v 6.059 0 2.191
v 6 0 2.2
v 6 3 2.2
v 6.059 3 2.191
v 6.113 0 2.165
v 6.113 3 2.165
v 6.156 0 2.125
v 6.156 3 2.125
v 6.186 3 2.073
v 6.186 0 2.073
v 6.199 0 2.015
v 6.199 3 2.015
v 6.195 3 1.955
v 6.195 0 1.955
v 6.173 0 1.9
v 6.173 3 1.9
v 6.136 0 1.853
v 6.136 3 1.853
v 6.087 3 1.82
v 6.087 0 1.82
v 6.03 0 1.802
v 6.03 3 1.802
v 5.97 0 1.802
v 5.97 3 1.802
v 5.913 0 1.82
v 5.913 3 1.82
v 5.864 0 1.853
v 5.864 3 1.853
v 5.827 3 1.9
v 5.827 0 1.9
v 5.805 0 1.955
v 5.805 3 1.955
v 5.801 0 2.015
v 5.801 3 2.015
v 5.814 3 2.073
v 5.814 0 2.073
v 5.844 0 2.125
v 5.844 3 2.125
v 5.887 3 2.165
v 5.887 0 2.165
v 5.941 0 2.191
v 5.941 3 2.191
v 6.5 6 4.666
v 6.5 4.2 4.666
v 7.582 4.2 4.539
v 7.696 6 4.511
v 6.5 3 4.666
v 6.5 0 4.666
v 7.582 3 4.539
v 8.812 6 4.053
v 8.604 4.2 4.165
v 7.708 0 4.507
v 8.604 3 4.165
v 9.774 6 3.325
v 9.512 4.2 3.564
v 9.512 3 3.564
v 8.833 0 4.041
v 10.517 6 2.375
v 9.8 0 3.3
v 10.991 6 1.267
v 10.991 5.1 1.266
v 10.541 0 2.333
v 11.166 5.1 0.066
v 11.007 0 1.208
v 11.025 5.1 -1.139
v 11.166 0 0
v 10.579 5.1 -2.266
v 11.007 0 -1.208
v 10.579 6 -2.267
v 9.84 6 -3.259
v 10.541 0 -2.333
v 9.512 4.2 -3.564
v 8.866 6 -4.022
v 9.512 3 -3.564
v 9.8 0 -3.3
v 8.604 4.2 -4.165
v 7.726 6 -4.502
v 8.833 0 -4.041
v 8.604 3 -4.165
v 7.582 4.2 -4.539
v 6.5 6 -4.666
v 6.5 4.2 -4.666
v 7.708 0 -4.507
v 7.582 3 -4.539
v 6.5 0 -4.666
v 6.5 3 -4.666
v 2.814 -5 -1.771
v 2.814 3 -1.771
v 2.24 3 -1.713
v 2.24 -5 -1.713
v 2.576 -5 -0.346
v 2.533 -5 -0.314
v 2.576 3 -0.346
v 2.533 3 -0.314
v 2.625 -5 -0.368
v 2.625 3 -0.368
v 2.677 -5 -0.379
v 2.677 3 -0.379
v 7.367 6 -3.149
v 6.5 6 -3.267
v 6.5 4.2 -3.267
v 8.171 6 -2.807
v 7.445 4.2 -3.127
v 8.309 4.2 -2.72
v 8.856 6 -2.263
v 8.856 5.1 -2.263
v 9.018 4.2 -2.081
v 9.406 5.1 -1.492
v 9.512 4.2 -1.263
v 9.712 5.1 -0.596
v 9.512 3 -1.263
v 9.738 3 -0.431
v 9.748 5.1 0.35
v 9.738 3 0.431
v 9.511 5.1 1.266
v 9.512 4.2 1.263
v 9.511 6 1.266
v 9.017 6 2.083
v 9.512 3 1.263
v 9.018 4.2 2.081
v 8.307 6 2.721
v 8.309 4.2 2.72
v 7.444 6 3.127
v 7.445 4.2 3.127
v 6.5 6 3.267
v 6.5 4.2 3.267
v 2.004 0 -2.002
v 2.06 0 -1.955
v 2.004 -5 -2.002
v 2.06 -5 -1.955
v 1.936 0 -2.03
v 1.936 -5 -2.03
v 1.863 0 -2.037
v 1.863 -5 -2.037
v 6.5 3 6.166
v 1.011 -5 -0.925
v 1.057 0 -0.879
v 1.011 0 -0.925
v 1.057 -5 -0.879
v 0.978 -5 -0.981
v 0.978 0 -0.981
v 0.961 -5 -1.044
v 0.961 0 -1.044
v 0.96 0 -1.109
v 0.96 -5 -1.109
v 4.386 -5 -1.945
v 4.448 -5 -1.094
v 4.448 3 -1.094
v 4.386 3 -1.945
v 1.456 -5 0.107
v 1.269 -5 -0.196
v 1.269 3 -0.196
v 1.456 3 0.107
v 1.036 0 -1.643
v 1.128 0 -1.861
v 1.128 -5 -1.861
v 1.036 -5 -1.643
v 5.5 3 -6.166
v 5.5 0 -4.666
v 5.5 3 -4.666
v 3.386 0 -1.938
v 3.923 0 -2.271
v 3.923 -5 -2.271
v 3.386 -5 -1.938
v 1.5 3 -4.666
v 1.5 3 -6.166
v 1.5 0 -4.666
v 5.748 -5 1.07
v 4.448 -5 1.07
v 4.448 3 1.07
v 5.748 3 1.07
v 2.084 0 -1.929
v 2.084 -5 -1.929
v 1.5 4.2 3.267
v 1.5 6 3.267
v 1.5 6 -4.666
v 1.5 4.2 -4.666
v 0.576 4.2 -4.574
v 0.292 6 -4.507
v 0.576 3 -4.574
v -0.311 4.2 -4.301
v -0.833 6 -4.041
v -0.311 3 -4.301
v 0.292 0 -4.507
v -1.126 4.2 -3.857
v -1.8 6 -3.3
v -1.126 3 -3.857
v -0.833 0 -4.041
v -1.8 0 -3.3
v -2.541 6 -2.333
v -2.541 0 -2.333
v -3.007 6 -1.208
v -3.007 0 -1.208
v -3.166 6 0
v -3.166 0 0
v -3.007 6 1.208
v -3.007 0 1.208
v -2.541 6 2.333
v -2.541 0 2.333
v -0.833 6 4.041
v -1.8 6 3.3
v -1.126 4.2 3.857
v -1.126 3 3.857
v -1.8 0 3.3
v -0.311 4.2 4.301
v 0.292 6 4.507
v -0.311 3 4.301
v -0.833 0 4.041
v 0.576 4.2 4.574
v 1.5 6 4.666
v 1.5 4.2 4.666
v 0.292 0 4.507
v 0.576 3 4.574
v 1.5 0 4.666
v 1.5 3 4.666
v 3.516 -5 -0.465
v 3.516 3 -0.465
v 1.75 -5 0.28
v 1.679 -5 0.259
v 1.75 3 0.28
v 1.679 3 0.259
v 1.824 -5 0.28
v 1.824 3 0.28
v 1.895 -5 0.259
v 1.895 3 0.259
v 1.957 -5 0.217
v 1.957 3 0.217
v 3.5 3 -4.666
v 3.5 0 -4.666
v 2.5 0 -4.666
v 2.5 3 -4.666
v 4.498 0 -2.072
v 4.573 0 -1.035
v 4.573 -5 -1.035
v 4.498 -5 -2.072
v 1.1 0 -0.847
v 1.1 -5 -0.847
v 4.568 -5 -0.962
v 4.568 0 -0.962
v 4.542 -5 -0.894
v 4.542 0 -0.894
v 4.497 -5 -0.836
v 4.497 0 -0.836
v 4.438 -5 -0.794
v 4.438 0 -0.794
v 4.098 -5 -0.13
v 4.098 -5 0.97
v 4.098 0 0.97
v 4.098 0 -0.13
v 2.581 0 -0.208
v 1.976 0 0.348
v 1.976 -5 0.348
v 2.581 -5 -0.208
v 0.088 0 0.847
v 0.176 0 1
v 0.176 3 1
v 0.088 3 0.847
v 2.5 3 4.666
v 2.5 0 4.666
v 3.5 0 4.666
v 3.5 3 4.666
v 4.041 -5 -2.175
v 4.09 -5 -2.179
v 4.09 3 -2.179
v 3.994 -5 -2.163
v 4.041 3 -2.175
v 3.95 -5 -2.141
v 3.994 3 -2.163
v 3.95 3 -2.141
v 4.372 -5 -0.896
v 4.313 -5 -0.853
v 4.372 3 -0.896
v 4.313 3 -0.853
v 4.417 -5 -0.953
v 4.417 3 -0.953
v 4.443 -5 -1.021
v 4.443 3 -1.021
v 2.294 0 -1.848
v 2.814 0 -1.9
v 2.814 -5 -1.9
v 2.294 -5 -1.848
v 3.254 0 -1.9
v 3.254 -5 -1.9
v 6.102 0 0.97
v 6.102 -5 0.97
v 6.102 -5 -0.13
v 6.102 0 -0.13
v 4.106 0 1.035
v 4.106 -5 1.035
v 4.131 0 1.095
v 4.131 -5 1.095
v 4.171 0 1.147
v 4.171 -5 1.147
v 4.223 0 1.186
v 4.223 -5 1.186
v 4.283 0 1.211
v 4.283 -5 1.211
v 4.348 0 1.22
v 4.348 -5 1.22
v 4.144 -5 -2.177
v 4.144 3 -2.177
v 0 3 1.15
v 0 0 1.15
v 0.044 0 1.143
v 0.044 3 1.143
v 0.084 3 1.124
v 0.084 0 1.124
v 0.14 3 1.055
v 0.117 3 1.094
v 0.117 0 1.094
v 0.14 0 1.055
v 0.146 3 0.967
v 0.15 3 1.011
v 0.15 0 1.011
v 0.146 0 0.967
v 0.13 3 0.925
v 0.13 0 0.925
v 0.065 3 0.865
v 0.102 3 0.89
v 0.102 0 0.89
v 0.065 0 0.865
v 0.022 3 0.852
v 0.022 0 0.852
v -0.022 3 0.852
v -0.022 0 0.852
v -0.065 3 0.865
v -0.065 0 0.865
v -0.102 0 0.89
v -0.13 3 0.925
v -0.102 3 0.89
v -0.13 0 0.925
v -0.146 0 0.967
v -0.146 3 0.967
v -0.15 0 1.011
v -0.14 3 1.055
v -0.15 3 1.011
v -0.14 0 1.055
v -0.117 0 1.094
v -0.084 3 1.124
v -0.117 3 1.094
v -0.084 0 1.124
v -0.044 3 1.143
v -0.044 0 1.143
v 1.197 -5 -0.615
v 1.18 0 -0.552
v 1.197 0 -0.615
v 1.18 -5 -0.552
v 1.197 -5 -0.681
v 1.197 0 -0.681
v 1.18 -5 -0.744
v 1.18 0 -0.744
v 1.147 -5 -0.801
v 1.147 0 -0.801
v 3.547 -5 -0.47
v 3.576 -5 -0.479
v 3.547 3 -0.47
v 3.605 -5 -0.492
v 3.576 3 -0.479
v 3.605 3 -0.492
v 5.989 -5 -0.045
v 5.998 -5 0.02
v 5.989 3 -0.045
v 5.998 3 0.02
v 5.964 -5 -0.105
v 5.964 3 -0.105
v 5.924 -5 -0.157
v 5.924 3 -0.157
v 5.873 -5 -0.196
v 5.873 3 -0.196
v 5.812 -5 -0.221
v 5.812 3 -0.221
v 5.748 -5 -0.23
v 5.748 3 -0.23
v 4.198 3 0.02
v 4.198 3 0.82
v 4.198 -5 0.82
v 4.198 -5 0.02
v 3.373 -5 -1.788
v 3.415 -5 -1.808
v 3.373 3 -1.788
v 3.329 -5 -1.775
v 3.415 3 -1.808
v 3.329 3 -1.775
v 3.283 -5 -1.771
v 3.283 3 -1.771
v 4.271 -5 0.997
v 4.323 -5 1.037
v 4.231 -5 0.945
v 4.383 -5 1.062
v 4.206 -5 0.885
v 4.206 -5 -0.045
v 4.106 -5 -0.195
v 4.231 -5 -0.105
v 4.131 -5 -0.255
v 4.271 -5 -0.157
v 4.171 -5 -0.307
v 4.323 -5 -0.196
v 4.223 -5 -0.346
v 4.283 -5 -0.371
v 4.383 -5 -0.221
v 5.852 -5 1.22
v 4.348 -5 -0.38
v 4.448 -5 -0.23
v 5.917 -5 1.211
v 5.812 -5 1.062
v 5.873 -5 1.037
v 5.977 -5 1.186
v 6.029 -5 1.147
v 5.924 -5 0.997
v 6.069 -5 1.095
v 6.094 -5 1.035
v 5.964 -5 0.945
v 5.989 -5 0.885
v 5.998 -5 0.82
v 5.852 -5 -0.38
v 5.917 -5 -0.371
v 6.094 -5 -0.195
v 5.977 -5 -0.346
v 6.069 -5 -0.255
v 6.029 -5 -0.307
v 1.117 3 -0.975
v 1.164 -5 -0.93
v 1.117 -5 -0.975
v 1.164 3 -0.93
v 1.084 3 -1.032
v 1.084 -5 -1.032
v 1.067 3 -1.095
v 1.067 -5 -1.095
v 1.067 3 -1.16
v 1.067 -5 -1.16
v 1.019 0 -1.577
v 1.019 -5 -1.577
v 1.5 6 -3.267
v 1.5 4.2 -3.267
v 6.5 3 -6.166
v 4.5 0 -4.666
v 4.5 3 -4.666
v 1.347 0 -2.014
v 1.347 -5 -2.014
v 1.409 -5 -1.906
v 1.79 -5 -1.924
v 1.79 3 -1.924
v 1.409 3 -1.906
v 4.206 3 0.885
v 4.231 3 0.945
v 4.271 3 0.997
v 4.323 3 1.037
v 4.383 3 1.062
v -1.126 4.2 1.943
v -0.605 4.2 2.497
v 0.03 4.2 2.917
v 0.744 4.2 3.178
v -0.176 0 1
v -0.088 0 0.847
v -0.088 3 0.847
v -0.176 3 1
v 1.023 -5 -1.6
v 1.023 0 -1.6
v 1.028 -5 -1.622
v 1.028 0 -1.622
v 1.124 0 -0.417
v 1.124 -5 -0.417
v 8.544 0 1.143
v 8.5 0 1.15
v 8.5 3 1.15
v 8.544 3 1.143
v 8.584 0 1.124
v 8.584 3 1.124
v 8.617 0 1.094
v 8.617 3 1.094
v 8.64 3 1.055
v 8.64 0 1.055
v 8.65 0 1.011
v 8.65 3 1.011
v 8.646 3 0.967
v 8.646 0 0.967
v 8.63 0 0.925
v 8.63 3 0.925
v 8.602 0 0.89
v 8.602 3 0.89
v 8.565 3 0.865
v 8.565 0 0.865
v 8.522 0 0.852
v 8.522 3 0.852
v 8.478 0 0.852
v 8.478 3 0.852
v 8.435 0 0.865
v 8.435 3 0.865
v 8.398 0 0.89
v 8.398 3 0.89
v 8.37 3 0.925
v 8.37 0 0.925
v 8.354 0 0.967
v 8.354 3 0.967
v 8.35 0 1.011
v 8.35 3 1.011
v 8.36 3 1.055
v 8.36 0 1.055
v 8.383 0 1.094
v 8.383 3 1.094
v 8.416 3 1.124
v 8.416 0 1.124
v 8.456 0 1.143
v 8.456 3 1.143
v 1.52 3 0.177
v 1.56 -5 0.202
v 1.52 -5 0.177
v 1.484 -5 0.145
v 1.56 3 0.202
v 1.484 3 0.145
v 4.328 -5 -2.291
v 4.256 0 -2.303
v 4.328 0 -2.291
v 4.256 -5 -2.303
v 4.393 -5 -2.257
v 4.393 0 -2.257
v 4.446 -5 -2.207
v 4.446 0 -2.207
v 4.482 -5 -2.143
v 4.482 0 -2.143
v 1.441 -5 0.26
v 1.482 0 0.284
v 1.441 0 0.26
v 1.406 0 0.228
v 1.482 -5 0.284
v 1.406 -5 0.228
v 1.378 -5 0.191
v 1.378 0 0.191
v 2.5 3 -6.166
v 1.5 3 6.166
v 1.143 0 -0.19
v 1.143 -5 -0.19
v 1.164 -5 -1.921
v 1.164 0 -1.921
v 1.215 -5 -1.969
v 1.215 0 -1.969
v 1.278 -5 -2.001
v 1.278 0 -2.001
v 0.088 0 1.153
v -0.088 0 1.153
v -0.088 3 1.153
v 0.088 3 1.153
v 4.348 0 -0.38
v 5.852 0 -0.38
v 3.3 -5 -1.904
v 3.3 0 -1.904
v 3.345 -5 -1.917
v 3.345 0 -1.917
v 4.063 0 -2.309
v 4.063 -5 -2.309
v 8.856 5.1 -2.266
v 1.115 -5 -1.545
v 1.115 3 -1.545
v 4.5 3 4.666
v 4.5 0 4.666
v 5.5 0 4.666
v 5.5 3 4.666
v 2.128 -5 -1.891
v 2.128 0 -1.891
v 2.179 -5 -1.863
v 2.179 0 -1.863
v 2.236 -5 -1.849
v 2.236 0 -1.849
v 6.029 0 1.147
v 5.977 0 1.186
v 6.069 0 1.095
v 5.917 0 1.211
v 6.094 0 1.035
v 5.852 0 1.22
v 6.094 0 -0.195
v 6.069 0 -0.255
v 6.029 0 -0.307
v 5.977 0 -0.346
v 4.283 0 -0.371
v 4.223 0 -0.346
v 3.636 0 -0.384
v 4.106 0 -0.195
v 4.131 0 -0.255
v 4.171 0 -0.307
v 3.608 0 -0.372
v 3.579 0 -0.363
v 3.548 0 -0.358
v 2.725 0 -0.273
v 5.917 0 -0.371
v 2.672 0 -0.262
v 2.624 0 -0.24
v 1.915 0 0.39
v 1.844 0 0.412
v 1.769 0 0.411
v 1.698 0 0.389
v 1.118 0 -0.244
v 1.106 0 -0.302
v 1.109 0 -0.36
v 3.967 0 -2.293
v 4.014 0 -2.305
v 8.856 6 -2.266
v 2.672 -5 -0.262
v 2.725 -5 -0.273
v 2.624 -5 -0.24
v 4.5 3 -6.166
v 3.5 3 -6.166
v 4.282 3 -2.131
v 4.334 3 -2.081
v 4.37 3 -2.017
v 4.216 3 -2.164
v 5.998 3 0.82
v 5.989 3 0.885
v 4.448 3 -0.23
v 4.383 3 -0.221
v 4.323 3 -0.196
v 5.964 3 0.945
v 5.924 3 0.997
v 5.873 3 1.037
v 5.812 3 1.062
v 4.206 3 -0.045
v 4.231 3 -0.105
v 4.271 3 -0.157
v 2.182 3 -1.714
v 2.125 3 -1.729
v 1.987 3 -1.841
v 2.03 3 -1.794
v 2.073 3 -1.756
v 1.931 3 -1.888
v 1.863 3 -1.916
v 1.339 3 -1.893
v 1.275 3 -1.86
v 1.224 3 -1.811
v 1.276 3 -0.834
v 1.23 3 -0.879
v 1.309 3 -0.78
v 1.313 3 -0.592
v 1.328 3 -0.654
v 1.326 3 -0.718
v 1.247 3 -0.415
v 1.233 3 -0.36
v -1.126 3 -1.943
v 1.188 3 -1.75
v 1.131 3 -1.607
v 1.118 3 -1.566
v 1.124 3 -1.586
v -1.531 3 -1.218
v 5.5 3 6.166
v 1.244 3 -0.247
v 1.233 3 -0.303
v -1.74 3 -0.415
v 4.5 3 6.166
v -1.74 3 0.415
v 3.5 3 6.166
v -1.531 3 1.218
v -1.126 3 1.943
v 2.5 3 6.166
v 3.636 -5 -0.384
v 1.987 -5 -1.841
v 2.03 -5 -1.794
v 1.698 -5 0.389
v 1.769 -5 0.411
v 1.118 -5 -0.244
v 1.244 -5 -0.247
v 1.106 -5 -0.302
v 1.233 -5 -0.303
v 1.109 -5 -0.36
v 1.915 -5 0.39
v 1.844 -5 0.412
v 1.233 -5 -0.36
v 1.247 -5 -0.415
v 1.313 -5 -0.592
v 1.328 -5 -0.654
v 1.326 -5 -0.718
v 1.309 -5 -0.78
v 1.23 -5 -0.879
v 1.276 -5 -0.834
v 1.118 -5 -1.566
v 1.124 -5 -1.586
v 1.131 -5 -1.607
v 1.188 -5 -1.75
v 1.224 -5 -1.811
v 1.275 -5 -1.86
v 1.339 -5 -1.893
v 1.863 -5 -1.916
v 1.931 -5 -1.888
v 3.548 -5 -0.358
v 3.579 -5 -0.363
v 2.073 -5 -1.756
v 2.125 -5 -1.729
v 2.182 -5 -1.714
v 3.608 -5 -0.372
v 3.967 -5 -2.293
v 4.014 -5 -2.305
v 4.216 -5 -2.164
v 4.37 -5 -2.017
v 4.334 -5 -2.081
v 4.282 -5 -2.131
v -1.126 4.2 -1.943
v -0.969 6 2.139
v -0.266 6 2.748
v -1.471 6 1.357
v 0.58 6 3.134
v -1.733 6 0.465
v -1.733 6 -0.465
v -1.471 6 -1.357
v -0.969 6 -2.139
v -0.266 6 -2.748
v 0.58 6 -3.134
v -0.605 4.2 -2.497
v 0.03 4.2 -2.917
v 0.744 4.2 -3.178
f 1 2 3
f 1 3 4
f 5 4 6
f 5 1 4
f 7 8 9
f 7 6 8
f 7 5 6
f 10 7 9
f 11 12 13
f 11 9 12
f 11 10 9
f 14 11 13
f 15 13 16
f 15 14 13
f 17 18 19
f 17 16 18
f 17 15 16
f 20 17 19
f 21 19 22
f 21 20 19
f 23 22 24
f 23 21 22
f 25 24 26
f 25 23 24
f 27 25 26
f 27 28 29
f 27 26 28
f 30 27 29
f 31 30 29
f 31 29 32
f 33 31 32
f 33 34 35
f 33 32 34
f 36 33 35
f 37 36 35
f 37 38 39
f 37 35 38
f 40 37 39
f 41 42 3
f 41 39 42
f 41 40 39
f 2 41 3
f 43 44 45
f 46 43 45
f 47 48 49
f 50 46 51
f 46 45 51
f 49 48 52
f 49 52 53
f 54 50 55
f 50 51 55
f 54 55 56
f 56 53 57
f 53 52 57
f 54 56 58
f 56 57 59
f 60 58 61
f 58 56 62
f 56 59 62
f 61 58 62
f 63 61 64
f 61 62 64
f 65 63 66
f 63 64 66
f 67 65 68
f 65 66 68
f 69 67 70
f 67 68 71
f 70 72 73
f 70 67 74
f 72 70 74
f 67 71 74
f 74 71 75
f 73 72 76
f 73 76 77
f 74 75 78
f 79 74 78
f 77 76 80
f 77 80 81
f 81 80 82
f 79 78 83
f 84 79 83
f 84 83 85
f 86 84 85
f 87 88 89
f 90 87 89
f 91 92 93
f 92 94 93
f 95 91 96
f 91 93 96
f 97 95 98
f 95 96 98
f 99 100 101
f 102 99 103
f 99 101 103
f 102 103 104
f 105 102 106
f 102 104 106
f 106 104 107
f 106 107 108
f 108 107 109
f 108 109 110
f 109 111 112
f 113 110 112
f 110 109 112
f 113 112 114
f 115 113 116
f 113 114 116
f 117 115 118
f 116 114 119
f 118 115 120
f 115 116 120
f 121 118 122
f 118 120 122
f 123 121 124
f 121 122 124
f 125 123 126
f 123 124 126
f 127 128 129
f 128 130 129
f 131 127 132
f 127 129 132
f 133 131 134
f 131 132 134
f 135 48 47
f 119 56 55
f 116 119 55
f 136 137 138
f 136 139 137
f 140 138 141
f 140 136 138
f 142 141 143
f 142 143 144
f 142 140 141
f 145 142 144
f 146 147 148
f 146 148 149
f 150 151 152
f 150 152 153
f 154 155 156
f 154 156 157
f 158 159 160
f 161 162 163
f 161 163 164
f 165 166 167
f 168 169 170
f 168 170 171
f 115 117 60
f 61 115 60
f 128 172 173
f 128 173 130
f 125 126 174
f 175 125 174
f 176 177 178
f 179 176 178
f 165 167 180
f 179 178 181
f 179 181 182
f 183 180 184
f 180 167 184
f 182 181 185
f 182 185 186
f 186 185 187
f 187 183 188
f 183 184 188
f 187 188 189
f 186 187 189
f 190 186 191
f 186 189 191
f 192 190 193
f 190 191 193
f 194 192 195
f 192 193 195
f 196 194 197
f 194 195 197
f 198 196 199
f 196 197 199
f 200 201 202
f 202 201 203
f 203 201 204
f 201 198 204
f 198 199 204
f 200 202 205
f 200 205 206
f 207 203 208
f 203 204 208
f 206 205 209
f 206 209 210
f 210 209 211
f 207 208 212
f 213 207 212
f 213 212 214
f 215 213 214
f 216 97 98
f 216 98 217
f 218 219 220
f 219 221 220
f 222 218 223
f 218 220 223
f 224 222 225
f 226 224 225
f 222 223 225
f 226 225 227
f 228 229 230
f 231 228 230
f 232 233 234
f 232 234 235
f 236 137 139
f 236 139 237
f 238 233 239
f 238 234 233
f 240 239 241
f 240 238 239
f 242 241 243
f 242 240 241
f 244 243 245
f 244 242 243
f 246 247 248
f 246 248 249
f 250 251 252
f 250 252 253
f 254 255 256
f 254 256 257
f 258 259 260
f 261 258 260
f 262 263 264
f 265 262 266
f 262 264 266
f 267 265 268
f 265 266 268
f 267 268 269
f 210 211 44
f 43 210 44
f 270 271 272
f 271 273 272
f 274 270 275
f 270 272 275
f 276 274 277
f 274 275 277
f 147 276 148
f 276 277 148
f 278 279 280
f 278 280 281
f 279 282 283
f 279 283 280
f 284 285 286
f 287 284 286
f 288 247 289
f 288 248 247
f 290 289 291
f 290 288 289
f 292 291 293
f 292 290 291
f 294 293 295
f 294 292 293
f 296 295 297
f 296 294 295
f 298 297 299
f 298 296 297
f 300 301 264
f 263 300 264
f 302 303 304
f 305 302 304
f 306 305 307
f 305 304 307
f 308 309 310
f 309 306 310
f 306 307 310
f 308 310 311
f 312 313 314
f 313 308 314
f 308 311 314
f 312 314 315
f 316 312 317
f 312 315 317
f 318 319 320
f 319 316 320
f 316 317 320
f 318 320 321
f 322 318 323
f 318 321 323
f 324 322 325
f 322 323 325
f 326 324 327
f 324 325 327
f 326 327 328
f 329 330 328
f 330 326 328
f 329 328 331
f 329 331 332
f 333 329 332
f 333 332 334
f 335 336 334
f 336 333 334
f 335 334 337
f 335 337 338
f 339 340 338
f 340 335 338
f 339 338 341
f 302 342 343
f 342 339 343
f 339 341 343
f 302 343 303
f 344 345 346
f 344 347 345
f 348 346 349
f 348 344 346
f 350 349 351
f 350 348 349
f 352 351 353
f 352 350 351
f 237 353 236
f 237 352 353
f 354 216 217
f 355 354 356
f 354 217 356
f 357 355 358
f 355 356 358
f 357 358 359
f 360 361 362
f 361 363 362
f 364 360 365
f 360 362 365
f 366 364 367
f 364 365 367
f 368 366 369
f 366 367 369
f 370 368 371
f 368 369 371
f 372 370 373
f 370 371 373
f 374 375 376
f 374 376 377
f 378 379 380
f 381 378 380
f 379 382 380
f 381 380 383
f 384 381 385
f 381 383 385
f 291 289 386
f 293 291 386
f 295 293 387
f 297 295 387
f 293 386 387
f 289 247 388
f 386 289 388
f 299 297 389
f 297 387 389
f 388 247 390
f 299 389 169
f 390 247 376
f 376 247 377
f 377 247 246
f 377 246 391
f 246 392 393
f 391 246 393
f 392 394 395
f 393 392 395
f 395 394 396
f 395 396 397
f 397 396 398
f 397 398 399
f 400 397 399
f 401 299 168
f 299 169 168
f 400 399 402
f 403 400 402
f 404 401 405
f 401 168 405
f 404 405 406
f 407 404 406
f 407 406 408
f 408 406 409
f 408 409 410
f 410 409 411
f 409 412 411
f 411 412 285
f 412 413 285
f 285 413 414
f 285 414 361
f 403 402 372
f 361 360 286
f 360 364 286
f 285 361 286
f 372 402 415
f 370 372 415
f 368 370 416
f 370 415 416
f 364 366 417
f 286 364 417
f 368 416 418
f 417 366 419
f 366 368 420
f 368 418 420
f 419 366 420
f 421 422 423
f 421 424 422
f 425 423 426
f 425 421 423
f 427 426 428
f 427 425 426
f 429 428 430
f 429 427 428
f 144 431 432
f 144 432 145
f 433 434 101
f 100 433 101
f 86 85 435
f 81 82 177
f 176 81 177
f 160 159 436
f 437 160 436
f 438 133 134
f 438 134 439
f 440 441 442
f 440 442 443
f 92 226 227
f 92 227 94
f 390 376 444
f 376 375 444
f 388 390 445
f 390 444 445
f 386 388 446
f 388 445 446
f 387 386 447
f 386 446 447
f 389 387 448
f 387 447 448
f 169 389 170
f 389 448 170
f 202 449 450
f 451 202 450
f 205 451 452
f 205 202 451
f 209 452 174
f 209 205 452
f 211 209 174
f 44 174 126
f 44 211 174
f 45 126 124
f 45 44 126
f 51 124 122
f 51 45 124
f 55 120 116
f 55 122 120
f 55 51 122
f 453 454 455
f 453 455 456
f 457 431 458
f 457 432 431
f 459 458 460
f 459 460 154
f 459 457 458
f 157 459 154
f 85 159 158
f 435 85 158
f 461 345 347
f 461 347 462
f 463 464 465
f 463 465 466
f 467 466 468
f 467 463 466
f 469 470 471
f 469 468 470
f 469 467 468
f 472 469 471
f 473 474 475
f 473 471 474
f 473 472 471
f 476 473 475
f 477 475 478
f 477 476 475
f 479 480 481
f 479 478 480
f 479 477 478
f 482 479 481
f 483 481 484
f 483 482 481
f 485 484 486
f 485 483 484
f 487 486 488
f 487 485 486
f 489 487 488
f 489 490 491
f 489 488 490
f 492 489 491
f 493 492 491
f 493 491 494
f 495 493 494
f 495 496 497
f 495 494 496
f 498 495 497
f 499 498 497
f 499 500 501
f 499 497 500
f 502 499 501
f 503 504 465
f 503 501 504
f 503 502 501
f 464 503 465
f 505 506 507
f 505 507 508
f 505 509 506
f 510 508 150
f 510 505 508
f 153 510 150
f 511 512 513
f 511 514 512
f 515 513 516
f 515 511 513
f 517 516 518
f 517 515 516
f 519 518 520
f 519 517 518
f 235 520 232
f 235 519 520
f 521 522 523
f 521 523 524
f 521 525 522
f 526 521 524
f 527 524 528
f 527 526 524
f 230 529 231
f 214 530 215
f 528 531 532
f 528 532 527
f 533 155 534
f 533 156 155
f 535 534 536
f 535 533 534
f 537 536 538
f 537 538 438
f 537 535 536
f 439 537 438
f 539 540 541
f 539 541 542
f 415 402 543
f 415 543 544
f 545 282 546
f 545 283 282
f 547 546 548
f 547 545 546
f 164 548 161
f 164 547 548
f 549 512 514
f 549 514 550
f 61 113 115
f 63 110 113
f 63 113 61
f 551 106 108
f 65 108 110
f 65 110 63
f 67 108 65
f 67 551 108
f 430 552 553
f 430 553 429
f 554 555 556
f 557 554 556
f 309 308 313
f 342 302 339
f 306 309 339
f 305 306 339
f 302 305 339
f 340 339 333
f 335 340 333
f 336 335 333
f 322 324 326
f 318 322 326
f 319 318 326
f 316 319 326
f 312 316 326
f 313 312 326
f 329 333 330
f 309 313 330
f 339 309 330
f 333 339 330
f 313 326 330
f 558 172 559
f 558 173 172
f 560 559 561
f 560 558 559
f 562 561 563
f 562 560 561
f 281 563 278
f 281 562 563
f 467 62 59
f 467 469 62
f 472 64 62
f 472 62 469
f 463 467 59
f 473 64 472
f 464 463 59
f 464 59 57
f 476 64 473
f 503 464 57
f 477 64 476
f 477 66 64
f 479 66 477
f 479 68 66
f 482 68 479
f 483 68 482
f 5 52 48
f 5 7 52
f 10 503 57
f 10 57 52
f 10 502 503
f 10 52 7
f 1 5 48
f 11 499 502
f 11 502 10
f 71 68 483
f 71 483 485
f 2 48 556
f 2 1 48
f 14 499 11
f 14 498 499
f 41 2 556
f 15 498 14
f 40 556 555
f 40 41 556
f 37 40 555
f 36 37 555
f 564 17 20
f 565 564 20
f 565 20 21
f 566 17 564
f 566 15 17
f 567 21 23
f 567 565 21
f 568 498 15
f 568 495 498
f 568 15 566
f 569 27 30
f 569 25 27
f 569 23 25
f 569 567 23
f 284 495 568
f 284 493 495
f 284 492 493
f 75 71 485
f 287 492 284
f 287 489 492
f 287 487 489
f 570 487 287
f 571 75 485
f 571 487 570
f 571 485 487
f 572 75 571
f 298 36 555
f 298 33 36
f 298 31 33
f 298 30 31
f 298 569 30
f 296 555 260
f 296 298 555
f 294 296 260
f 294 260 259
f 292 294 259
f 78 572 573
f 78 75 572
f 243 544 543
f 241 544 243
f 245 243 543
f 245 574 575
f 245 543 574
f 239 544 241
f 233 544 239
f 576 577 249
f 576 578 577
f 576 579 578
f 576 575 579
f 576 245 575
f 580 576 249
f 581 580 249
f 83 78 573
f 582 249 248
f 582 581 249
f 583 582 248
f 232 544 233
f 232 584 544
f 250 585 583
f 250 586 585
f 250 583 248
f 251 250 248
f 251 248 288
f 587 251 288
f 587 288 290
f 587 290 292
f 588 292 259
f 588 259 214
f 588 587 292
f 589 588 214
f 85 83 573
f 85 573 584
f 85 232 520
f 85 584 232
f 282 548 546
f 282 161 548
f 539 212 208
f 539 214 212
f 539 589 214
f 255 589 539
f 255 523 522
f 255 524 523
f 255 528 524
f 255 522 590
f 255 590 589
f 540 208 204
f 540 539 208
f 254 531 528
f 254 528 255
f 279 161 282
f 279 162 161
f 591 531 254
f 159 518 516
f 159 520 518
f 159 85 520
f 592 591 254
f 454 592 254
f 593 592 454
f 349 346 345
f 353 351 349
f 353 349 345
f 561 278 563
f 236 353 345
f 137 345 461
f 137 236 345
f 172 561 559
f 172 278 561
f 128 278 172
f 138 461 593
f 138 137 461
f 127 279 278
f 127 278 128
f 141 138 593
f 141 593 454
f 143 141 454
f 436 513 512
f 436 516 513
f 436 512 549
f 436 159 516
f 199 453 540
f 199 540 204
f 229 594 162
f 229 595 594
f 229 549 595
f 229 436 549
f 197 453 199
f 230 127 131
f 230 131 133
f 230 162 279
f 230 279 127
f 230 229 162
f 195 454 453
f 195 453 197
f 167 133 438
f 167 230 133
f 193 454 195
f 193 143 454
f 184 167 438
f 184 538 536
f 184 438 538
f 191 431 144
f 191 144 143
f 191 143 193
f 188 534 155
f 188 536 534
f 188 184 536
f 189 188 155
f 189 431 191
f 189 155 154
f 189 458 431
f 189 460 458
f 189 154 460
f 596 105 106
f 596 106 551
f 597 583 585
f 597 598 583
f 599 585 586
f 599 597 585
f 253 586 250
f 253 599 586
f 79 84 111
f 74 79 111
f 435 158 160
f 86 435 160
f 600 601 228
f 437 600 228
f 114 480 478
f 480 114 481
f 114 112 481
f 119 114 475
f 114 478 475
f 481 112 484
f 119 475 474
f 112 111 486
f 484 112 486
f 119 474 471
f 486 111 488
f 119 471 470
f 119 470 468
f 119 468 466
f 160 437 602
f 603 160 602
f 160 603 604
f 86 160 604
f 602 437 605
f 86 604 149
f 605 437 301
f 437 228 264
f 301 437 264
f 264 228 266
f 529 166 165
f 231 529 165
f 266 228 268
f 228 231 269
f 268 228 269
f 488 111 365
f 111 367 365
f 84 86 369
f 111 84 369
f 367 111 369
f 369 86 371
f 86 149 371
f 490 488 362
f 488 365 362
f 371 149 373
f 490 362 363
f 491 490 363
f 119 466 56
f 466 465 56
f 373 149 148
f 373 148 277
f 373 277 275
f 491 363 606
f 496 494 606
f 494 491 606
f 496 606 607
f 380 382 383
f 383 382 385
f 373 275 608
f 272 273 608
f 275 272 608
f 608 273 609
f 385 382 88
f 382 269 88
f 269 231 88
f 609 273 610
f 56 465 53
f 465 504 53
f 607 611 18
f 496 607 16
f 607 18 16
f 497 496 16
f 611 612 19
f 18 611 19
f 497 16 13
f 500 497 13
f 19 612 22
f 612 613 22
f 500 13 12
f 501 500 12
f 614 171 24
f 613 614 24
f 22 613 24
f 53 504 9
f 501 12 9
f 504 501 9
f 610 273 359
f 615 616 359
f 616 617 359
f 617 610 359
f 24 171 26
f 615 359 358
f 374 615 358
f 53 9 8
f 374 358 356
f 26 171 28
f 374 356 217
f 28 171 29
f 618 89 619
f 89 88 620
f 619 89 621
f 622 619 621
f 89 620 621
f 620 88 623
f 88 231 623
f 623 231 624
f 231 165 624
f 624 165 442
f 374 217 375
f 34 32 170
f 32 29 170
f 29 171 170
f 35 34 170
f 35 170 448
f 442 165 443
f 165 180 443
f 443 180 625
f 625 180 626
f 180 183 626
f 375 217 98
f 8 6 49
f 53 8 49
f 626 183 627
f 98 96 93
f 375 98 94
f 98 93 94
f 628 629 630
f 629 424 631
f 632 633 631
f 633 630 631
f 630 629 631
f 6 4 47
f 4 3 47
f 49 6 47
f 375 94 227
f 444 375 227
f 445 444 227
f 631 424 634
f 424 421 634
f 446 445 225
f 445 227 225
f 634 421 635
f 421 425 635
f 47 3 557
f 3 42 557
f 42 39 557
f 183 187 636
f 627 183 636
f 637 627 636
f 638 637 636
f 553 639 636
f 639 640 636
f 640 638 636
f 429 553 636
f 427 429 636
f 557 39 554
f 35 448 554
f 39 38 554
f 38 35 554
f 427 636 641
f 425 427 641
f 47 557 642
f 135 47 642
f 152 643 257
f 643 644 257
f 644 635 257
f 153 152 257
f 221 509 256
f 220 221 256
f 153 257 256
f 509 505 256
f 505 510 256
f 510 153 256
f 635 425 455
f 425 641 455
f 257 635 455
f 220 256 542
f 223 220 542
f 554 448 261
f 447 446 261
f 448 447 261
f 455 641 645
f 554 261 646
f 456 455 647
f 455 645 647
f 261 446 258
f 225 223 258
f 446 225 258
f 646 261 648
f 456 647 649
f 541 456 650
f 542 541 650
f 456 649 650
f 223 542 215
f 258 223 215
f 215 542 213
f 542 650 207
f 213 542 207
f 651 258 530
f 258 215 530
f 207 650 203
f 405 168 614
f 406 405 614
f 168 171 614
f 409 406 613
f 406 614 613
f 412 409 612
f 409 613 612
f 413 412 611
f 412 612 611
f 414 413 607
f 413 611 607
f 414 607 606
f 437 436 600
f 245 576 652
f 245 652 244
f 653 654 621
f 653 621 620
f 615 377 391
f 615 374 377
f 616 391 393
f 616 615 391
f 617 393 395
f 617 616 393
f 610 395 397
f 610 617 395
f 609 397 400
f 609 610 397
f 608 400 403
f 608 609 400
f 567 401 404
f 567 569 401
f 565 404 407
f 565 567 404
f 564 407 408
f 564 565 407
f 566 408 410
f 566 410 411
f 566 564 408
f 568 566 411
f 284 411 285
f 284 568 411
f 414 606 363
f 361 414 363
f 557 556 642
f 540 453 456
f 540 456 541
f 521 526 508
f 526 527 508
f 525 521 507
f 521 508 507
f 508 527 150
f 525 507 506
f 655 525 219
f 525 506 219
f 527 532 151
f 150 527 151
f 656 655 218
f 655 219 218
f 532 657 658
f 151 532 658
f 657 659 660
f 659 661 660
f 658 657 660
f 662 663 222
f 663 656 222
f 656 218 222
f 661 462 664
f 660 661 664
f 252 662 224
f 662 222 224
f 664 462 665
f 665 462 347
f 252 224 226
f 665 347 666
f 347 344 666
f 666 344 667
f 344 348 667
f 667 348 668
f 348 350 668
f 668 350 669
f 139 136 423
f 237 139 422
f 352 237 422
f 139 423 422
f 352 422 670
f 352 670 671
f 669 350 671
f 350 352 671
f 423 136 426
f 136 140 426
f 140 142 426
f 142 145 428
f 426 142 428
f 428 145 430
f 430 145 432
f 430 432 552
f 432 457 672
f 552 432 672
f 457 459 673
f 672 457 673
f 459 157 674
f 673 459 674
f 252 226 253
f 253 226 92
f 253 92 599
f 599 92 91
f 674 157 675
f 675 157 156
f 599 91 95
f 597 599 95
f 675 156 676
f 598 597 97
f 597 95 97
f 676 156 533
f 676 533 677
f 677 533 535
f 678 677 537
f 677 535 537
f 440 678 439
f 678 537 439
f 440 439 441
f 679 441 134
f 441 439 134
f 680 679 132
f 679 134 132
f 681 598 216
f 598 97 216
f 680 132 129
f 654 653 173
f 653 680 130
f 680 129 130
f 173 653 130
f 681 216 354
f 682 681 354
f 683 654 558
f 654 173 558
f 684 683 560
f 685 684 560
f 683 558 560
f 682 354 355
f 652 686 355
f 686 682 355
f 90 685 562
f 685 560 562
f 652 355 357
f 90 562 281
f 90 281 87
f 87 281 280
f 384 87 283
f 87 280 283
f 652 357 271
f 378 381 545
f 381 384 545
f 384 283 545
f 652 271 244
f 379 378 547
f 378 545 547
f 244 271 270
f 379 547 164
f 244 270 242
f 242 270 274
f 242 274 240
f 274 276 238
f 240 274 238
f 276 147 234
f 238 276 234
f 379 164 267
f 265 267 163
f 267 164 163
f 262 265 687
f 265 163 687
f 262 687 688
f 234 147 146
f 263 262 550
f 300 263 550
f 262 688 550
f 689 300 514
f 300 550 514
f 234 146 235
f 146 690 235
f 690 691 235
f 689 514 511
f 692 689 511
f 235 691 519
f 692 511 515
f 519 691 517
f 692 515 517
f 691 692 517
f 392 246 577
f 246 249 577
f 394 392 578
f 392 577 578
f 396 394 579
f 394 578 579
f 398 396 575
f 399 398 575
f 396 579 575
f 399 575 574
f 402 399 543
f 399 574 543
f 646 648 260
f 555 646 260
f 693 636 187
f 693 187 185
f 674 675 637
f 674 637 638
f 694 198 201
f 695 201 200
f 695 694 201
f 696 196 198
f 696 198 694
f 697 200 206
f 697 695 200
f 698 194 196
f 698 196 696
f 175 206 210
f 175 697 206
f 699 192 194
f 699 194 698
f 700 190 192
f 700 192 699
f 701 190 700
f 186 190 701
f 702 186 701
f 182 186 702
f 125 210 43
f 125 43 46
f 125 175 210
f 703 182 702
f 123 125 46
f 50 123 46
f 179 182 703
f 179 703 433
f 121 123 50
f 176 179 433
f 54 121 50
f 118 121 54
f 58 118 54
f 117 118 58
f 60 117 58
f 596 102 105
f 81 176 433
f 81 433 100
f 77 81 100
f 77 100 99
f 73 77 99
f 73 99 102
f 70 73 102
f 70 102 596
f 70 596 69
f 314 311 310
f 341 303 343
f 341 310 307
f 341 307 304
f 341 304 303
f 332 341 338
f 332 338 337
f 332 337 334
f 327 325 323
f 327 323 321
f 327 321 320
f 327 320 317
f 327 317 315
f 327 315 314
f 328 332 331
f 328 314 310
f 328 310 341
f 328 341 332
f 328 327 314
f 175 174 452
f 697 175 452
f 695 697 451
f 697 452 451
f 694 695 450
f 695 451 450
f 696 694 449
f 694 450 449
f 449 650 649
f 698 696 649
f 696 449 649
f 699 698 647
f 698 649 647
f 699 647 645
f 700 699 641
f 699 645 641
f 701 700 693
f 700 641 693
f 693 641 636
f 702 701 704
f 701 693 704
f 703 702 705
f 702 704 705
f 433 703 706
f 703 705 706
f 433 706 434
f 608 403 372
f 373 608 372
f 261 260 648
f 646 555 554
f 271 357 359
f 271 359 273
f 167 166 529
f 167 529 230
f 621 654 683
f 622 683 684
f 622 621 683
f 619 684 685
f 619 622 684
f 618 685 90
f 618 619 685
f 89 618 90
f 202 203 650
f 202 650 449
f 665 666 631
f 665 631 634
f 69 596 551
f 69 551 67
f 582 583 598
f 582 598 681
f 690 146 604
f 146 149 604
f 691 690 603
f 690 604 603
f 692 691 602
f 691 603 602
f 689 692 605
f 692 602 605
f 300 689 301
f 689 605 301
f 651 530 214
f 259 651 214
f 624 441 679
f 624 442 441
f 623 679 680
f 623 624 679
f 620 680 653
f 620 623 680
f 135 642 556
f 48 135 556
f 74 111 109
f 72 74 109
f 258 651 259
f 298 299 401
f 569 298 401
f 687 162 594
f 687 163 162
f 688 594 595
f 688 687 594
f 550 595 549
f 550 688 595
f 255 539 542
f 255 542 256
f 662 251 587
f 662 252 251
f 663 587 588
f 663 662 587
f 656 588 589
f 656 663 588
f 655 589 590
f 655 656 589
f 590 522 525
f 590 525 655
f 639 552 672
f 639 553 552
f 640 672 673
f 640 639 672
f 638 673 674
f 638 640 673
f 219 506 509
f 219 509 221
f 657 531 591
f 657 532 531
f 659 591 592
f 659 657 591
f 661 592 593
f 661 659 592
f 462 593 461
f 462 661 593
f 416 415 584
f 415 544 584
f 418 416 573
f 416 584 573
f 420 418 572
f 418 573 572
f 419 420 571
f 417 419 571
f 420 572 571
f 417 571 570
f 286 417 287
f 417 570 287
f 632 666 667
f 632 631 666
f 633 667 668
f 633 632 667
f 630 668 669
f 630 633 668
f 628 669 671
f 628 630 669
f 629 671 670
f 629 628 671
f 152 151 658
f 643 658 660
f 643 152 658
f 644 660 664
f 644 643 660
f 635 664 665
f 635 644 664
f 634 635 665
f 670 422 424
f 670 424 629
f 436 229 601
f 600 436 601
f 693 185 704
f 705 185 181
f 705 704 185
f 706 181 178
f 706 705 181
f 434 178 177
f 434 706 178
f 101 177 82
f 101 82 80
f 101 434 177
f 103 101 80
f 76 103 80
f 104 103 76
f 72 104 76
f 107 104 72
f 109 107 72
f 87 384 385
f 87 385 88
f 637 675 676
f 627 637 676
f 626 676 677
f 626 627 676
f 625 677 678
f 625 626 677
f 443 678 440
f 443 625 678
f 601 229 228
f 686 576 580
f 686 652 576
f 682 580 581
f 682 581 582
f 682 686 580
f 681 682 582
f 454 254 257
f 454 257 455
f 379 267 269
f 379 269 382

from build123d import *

# Parameters (mm, degrees)
LIP_DEPTH                    = 6
BASE_DEPTH                   = 3
LAMDABREGMAGUIDES_DEPTH      = 5
LAMDABREGMAGUIDES_DEPTH_BACK = 5
SKETCH16_R                   = 0.15
SKETCH16_R_2                 = 0.2
SKETCH3_W                    = 10.638387248
SKETCH3_H                    = 1.2
CUT4ACRYLIC_DEPTH            = 10
SKETCH4_W                    = 2.35
SKETCH4_H                    = 3.533
CUTFORGROUNDPIN_DEPTH        = 0.9
BOSS_EXTRUDE6_DEPTH          = 1
CRVPATTERN1_START            = 3.5
CRVPATTERN1_DEPTH            = 1
CRVPATTERN1_START_2          = 5.5
CRVPATTERN1_2_DEPTH          = 1
BOSS_EXTRUDE7_DEPTH          = 1
CRVPATTERN5_START            = 3.5
CRVPATTERN5_DEPTH            = 1
CRVPATTERN5_START_2          = 5.5
CRVPATTERN5_2_DEPTH          = 1
BOSS_EXTRUDE8_DEPTH          = 0.5
BOSS_EXTRUDE8_DEPTH_BACK     = 5
SKETCH34_W                   = 2.004608144
SKETCH34_H                   = 1.59969208
BOSS_EXTRUDE9_DEPTH          = 5
CUT_EXTRUDE1_DEPTH           = 16.057106113
CUT_EXTRUDE1_DEPTH_BACK      = 16.057106113
CUT_EXTRUDE3_DEPTH           = 10
CUT_EXTRUDE3_DEPTH_BACK      = 10
SKETCH32_W                   = 1.8
SKETCH32_H                   = 1.3
FILLET1_R                    = 0.25


# Read off the part's stored shape, not the designer's step: Lip, CrvPattern1, CrvPattern5
with BuildPart() as part:
    # Lip outline → Lip (new body)
    with BuildSketch(Plane(origin=(0, 0, 0), x_dir=(1, 0, 0), z_dir=(0, 1, 0))):
        with BuildLine():
            ThreePointArc((1.5, 4.6665), (-3.1665, 0), (1.5, -4.6665))
            Line((1.5, -4.6665), (6.5, -4.6665))
            ThreePointArc((6.5, -4.6665), (11.1665, 0), (6.5, 4.6665))
            Line((6.5, 4.6665), (1.5, 4.6665))
        make_face()
        with BuildLine():
            Line((6.5, -3.2665), (1.5, -3.2665))
            ThreePointArc((1.5, -3.2665), (-1.7665, 0), (1.5, 3.2665))
            Line((1.5, 3.2665), (6.5, 3.2665))
            ThreePointArc((6.5, 3.2665), (9.7665, 0), (6.5, -3.2665))
        make_face(mode=Mode.SUBTRACT)
    extrude(amount=LIP_DEPTH)

    # Sketch2 → Base (add)
    with BuildSketch(Plane(origin=(0, 0, 0), x_dir=(1, 0, 0), z_dir=(0, 1, 0))):
        with BuildLine():
            Line((6.5, -3.2665), (1.5, -3.2665))
            ThreePointArc((1.5, -3.2665), (-1.7665, 0), (1.5, 3.2665))
            Line((1.5, 3.2665), (6.5, 3.2665))
            ThreePointArc((6.5, 3.2665), (9.7665, 0), (6.5, -3.2665))
        make_face()
    extrude(amount=BASE_DEPTH)

    # Sketch16 → LamdaBregmaGuides (cut, two sides: drawn at the far end of the back side and taken through both)
    # profile 1 of 3: a face of its own
    with BuildSketch(Plane(origin=(0, 0, 0), x_dir=(1, 0, 0), z_dir=(0, 1, 0)).offset(-LAMDABREGMAGUIDES_DEPTH_BACK)):
        with Locations(Location((8.5, -1, 0), (0, 0, 270))):
            Circle(SKETCH16_R)
    # profile 2 of 3: a face of its own
    with BuildSketch(Plane(origin=(0, 0, 0), x_dir=(1, 0, 0), z_dir=(0, 1, 0)).offset(-LAMDABREGMAGUIDES_DEPTH_BACK)):
        with Locations(Location((6, -2, 0), (0, 0, 270))):
            Circle(SKETCH16_R_2)
    # profile 3 of 3: a face of its own
    with BuildSketch(Plane(origin=(0, 0, 0), x_dir=(1, 0, 0), z_dir=(0, 1, 0)).offset(-LAMDABREGMAGUIDES_DEPTH_BACK)):
        Polygon((0.176095573, -1), (0.088047787, -0.84749676), (-0.088047787, -0.84749676), (-0.176095573, -1), (-0.088047787, -1.15250324), (0.088047787, -1.15250324), align=None)
        with Locations(Location((0, -1, 0), (0, 0, 270))):
            Circle(SKETCH16_R, mode=Mode.SUBTRACT)
    extrude(amount=LAMDABREGMAGUIDES_DEPTH + LAMDABREGMAGUIDES_DEPTH_BACK, mode=Mode.SUBTRACT)


with BuildPart() as lamdabregmaguides_piece_1:
    # of the separate pieces the step leaves, piece 1, a body of its own (lamdabregmaguides_pieces)
    add(part.part.solids().sort_by_distance((6.5, 0, -4.6665))[0])

    # Sketch3 → Cut4Acrylic (cut)
    with BuildSketch(Plane.XY.offset(4.6665)):
        with Locations((4.193105486, 3.6)):
            Rectangle(SKETCH3_W, SKETCH3_H)
    extrude(amount=-CUT4ACRYLIC_DEPTH, mode=Mode.SUBTRACT)

    # Sketch4 → CutforGroundPin (cut)
    with BuildSketch(Plane(origin=(0, 6, 0), x_dir=(1, 0, 0), z_dir=(0, 1, 0))):
        with Locations((10.030760676, 0.5)):
            Rectangle(SKETCH4_W, SKETCH4_H)
    extrude(amount=-CUTFORGROUNDPIN_DEPTH, mode=Mode.SUBTRACT)

    # Sketch21 → Boss-Extrude6 (add)
    with BuildSketch(Plane(origin=(1.5, 0, 0), x_dir=(0, 0, -1), z_dir=(1, 0, 0))):
        Polygon((-4.6665, 3), (-6.1665, 3), (-4.6665, 0), align=None)
    extrude(amount=BOSS_EXTRUDE6_DEPTH)

    # CrvPattern1 outline → CrvPattern1 (add)
    with BuildSketch(Plane.YZ.offset(CRVPATTERN1_START)):
        Polygon((0, 4.6665), (3, 4.6665), (3, 6.1665), align=None)
    extrude(amount=CRVPATTERN1_DEPTH)

    # CrvPattern1 2 outline → CrvPattern1 2 (add)
    with BuildSketch(Plane.YZ.offset(CRVPATTERN1_START_2)):
        Polygon((0, 4.6665), (3, 4.6665), (3, 6.1665), align=None)
    extrude(amount=CRVPATTERN1_2_DEPTH)

    # Sketch22 → Boss-Extrude7 (add)
    with BuildSketch(Plane(origin=(1.5, 0, 0), x_dir=(0, 0, -1), z_dir=(1, 0, 0))):
        Polygon((4.6665, 0), (4.6665, 3), (6.1665, 3), align=None)
    extrude(amount=BOSS_EXTRUDE7_DEPTH)

    # CrvPattern5 outline → CrvPattern5 (add)
    with BuildSketch(Plane.YZ.offset(CRVPATTERN5_START)):
        Polygon((0, -4.6665), (3, -6.1665), (3, -4.6665), align=None)
    extrude(amount=CRVPATTERN5_DEPTH)

    # CrvPattern5 2 outline → CrvPattern5 2 (add)
    with BuildSketch(Plane.YZ.offset(CRVPATTERN5_START_2)):
        Polygon((0, -4.6665), (3, -6.1665), (3, -4.6665), align=None)
    extrude(amount=CRVPATTERN5_2_DEPTH)

    # Sketch34 → Boss-Extrude8 (add, two sides: drawn at the far end of the back side and taken through both)
    with BuildSketch(Plane(origin=(0, 0, 0), x_dir=(1, 0, 0), z_dir=(0, 1, 0)).offset(-BOSS_EXTRUDE8_DEPTH_BACK)):
        with Locations((5.1, -0.42)):
            Rectangle(SKETCH34_W, SKETCH34_H)
    extrude(amount=BOSS_EXTRUDE8_DEPTH + BOSS_EXTRUDE8_DEPTH_BACK)

    # Sketch36 → Boss-Extrude9 (add)
    with BuildSketch(Plane(origin=(0, 0, 0), x_dir=(-1, 0, 0), z_dir=(0, -1, 0))):
        Polygon((-1.981043585, 2.042444066), (-1.188700431, 2.006428468), (-1.022968968, 1.61122267), (-0.942337029, 0.966167161), (-1.25374802, 0.730249744), (-1.075687083, 0.299154844), (-1.416217307, -0.252738967), (-1.851184586, -0.463632193), (-2.6419687, 0.264721596), (-3.594629911, 0.362934092), (-4.58544349, 0.869349921), (-4.481834345, 2.296853703), (-3.98734241, 2.310982044), (-3.32576156, 1.9), (-2.814014925, 1.9), (-2.168339777, 1.835432485), align=None)
    extrude(amount=BOSS_EXTRUDE9_DEPTH)

    # Sketch31 → Cut-Extrude1 (cut, two sides: drawn at the far end of the back side and taken through both)
    with BuildSketch(Plane(origin=(0, 3, 0), x_dir=(1, 0, 0), z_dir=(0, 1, 0)).offset(-CUT_EXTRUDE1_DEPTH_BACK)):
        Polygon((1.831765382, -0.331969349), (2.594330725, 0.370393466), (3.562885826, 0.470244508), (4.460112717, 0.928827141), (4.369983566, 2.170606548), (4.014324084, 2.180768248), (3.35404923, 1.770597505), (2.81404923, 1.770597505), (2.114263926, 1.700618975), (1.908057574, 1.929012942), (1.248057574, 1.899012942), (1.118618993, 1.576661716), (1.048618993, 1.016661716), (1.378618993, 0.766661716), (1.204307806, 0.300181554), (1.494307806, -0.169818446), align=None)
    extrude(amount=CUT_EXTRUDE1_DEPTH + CUT_EXTRUDE1_DEPTH_BACK, mode=Mode.SUBTRACT)

    # Sketch32 → Cut-Extrude3 (cut, two sides: drawn at the far end of the back side and taken through both)
    with BuildSketch(Plane(origin=(0, 0, 0), x_dir=(1, 0, 0), z_dir=(0, 1, 0)).offset(-CUT_EXTRUDE3_DEPTH_BACK)):
        with Locations((5.097695928, -0.42015396)):
            Rectangle(SKETCH32_W, SKETCH32_H)
    extrude(amount=CUT_EXTRUDE3_DEPTH + CUT_EXTRUDE3_DEPTH_BACK, mode=Mode.SUBTRACT)

    # Fillet1
    fillet1_edges = [lamdabregmaguides_piece_1.edges().sort_by_distance(p)[0] for p in [
        (6.102304072, -2.5, -0.37984604),
        (6.102304072, -2.5, 1.21984604),
        (4.097695928, -2.5, 1.21984604),
        (4.097695928, -2.5, -0.37984604),
        (0.942337029, -2.5, -0.966167161),
        (1.022968968, -2.5, -1.61122267),
        (1.188700431, -2.5, -2.006428468),
        (1.981043585, -2.5, -2.042444066),
        (2.168339777, -2.5, -1.835432485),
        (2.814014925, -2.5, -1.9),
        (3.32576156, -2.5, -1.9),
        (3.98734241, -2.5, -2.310982044),
        (4.481834345, -2.5, -2.296853703),
        (4.58544349, -2.5, -0.869349921),
        (3.594629911, -2.5, -0.362934092),
        (2.6419687, -2.5, -0.264721596),
        (1.851184586, -2.5, 0.463632193),
        (1.416217307, -2.5, 0.252738967),
        (1.075687083, -2.5, -0.299154844),
        (1.25374802, -2.5, -0.730249744),
        (1.831765382, -1, 0.331969349),
        (1.494307806, -1, 0.169818446),
        (1.204307806, -1, -0.300181554),
        (1.378618993, -1, -0.766661716),
        (1.048618993, -1, -1.016661716),
        (1.118618993, -1, -1.576661716),
        (1.248057574, -1, -1.899012942),
        (1.908057574, -1, -1.929012942),
        (2.114263926, -1, -1.700618975),
        (2.81404923, -1, -1.770597505),
        (3.35404923, -1, -1.770597505),
        (4.014324084, -1, -2.180768248),
        (4.369983566, -1, -2.170606548),
        (4.460112717, -1, -0.928827141),
        (3.562885826, -1, -0.470244508),
        (2.594330725, -1, -0.370393466),
        (5.997695928, -1, 1.07015396),
        (5.997695928, -1, -0.22984604),
        (4.197695928, -1, -0.22984604),
        (4.197695928, -1, 1.07015396),
    ]]
    fillet(fillet1_edges, radius=FILLET1_R)


with BuildPart() as lamdabregmaguides_piece_2:
    # of the separate pieces the step leaves, piece 2, a body of its own (lamdabregmaguides_pieces)
    add(part.part.solids().sort_by_distance((0, 0, 1.15))[0])


solid = Compound([lamdabregmaguides_piece_1.part, lamdabregmaguides_piece_2.part])
